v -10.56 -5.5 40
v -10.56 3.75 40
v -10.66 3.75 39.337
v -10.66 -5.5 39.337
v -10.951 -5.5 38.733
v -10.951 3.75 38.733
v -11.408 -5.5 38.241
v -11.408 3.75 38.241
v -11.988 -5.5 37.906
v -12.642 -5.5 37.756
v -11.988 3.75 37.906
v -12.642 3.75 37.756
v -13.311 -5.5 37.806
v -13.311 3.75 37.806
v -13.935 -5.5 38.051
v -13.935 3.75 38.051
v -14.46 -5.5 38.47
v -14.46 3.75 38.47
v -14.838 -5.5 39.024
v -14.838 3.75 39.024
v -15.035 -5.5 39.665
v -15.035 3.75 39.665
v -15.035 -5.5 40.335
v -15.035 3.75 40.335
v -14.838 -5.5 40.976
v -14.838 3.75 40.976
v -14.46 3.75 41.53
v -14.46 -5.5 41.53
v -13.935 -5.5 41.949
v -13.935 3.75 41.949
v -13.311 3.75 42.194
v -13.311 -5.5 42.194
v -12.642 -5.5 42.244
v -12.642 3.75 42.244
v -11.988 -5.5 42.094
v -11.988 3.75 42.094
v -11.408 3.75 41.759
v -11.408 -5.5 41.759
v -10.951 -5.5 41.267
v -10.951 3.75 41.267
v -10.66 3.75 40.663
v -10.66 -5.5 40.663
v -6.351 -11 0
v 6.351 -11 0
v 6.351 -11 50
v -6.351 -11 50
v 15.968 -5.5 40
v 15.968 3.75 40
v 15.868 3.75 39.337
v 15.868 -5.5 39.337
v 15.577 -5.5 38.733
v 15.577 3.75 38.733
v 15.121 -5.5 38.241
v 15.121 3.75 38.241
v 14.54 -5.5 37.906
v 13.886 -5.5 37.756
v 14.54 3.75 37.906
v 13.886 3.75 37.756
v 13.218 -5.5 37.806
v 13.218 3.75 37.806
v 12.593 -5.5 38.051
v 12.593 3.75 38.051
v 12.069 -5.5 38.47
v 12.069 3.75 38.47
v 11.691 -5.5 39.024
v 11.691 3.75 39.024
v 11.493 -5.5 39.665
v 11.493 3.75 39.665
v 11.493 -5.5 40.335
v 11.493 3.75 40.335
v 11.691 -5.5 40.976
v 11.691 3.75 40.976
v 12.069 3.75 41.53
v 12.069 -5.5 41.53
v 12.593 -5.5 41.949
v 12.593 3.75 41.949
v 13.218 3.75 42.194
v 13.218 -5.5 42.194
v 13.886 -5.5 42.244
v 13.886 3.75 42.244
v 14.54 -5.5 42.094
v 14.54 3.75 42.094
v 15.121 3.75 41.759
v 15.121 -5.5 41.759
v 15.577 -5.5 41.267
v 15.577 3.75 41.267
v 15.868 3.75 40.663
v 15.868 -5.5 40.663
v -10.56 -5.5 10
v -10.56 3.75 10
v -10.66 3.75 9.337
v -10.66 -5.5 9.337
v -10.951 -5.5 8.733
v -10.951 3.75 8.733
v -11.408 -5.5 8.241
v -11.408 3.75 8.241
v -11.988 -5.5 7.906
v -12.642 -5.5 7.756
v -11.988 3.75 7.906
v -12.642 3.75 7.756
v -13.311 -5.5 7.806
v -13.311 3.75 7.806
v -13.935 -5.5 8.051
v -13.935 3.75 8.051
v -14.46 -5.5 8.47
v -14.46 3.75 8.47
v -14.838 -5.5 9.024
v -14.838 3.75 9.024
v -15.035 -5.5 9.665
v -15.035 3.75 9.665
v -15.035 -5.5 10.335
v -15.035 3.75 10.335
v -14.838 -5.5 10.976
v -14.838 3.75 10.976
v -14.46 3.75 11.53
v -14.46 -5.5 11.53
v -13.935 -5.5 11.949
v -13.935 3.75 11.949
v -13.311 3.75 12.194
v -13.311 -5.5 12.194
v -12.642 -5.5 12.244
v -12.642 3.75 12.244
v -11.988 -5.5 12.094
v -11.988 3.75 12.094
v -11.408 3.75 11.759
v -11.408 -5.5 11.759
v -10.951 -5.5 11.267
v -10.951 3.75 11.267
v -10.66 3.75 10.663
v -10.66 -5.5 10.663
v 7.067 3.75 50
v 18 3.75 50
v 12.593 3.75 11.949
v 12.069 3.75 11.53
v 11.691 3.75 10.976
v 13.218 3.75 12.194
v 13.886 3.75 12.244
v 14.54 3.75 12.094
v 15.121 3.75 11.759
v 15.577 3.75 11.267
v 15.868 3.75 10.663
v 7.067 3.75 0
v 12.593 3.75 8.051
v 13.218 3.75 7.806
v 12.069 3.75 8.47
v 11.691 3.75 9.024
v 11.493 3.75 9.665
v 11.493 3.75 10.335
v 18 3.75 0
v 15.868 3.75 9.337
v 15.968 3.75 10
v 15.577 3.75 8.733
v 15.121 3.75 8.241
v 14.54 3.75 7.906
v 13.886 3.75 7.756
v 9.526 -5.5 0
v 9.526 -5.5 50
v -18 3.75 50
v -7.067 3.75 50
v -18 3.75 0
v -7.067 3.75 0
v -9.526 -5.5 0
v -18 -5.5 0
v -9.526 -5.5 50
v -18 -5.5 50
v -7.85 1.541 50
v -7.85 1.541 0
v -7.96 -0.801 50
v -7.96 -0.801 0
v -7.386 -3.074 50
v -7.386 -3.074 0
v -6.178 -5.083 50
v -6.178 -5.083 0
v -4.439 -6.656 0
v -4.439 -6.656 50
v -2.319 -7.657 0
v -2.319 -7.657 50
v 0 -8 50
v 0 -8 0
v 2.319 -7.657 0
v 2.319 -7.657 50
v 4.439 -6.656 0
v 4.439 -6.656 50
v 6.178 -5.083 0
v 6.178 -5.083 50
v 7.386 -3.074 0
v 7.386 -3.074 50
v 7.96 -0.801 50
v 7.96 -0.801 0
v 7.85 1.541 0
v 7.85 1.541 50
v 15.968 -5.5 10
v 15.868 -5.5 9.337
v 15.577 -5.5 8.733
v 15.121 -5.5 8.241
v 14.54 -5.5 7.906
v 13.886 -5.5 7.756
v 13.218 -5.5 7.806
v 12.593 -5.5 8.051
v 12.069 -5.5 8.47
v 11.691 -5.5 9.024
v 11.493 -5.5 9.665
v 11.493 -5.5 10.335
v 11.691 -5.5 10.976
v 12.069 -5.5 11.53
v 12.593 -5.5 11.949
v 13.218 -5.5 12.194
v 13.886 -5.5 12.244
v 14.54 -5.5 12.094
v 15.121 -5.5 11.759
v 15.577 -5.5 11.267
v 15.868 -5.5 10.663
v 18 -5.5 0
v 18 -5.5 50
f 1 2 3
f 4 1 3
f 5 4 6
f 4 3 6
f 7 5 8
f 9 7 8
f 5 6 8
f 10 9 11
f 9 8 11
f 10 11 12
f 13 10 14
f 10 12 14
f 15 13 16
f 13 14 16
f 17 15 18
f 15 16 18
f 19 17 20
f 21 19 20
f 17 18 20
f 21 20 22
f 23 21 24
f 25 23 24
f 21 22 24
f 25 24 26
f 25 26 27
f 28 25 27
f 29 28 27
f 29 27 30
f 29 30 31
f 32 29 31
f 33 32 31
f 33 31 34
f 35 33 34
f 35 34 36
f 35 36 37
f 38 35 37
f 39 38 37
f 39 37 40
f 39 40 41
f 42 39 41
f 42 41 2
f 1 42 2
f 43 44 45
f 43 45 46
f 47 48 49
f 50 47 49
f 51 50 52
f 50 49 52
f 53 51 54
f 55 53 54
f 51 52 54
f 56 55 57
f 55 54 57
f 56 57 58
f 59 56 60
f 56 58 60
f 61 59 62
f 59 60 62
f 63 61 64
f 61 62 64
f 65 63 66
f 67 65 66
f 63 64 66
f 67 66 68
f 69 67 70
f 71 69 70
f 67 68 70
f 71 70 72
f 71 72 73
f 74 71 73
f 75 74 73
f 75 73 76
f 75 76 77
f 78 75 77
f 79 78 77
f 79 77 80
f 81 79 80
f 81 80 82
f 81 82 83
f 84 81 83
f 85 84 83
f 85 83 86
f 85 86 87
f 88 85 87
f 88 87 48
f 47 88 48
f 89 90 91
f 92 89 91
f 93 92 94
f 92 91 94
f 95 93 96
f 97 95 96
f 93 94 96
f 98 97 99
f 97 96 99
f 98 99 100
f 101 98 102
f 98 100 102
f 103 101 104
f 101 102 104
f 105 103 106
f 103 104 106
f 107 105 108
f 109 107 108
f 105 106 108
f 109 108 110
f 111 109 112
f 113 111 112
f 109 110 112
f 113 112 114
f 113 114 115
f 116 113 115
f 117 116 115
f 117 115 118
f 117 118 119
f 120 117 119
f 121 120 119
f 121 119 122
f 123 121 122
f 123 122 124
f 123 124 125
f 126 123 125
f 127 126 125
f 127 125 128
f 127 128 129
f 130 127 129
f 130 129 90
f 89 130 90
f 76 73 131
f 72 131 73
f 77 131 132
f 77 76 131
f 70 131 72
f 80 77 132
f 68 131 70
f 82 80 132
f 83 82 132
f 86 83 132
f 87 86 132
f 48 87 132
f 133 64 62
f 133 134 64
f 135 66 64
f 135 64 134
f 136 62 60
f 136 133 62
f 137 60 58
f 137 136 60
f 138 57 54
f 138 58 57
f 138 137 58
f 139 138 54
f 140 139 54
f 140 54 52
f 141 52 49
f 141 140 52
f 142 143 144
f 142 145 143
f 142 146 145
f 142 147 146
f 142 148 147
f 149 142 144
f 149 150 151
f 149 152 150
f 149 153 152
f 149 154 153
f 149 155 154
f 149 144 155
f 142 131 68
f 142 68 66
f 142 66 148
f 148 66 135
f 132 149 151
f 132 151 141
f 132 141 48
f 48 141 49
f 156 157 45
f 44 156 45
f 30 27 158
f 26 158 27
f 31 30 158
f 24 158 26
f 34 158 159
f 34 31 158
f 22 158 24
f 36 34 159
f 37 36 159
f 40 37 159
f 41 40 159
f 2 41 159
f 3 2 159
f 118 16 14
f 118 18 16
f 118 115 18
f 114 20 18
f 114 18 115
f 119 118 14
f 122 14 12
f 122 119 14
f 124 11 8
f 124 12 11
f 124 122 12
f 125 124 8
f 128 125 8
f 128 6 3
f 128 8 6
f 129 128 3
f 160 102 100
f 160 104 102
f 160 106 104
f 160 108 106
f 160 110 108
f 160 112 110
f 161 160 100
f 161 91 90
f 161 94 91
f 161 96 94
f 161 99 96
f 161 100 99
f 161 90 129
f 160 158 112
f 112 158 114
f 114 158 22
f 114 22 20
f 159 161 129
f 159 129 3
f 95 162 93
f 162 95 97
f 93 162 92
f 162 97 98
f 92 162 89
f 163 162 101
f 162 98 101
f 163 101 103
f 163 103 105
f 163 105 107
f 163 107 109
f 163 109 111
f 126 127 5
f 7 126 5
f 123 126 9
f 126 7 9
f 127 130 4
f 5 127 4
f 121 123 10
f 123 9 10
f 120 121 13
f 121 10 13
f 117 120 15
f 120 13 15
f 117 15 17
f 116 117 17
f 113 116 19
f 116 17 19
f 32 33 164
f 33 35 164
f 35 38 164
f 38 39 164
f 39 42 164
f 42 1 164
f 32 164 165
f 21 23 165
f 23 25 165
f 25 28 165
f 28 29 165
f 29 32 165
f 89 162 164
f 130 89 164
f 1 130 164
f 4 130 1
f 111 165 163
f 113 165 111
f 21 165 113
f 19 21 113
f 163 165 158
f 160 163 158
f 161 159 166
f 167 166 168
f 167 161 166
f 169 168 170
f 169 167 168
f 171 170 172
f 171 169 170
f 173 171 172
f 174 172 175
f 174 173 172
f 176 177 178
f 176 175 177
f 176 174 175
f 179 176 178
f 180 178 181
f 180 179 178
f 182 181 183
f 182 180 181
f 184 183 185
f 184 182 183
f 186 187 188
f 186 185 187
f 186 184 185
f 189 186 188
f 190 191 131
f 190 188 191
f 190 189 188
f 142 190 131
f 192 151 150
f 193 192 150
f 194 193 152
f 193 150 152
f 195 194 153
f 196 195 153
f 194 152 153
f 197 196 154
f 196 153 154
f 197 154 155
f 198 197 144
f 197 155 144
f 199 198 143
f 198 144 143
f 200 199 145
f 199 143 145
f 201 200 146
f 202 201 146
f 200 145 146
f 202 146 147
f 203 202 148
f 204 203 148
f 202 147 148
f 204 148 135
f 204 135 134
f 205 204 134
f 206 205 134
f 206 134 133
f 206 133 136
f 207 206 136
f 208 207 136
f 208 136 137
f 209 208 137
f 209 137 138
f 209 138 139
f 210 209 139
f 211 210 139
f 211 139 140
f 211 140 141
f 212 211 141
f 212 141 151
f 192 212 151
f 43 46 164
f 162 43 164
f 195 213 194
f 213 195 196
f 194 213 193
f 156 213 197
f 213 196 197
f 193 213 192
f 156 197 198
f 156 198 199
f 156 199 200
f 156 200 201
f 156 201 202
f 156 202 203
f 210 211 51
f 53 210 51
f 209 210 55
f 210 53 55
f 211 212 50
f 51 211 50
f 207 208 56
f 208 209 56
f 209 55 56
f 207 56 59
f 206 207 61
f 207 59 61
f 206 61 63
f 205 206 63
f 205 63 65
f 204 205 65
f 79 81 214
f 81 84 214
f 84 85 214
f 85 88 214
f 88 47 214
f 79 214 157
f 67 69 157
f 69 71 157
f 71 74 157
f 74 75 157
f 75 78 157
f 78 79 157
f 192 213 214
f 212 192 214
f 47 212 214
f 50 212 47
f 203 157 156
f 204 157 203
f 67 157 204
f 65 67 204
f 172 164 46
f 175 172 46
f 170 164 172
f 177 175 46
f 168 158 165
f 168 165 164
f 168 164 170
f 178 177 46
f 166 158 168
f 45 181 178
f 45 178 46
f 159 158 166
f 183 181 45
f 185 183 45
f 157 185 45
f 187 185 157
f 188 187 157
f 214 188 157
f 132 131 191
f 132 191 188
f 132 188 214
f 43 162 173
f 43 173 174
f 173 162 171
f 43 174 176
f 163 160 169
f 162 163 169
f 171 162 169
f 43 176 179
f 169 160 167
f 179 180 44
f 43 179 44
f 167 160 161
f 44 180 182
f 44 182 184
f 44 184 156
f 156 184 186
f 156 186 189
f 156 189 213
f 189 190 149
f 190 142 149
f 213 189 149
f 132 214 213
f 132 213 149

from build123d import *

# Parameters (mm, degrees)
IZIM1_W                     = 36
IZIM1_H                     = 36
IZIM1_R                     = 8
Y_KSEKLIK_EKSTR_ZYON1_DEPTH = 50
IZIM2_W                     = 36
IZIM2_H                     = 5
KES_EKSTR_ZYON1_DEPTH       = 50
IZIM3_W                     = 36
IZIM3_H                     = 3
KES_EKSTR_ZYON2_DEPTH       = 50
KES_EKSTR_ZYON3_DEPTH       = 50
M4_BO_LUKLU_DELIK1_D        = 4.5
KES_EKSTR_ZYON5_START       = -50
KES_EKSTR_ZYON5_DEPTH       = 50


# Read off the part's stored shape, not the designer's step: Kes-Ekstrüzyon5
with BuildPart() as part:
    # Çizim1 → Yükseklik-Ekstrüzyon1 (new body)
    with BuildSketch(Plane.XY):
        Rectangle(IZIM1_W, IZIM1_H)
        Circle(IZIM1_R, mode=Mode.SUBTRACT)
    extrude(amount=Y_KSEKLIK_EKSTR_ZYON1_DEPTH)

    # Çizim2 → Kes-Ekstrüzyon1 (cut)
    with BuildSketch(Plane.XY.offset(50)):
        with Locations((0, 15.5)):
            Rectangle(IZIM2_W, IZIM2_H)
    extrude(amount=-KES_EKSTR_ZYON1_DEPTH, mode=Mode.SUBTRACT)

    # Çizim3 → Kes-Ekstrüzyon2 (cut)
    with BuildSketch(Plane.XY.offset(50)):
        with Locations((0, -16.5)):
            Rectangle(IZIM3_W, IZIM3_H)
    extrude(amount=-KES_EKSTR_ZYON2_DEPTH, mode=Mode.SUBTRACT)

    # Çizim4 → Kes-Ekstrüzyon3 (cut)
    with BuildSketch(Plane.XY.offset(50)):
        Polygon((-6.350852961, -11), (-9.526279442, -5.5), (-18, -5.5), (-18, -15), (18, -15), (18, -5.5), (9.526279442, -5.5), (6.350852961, -11), align=None)
    extrude(amount=-KES_EKSTR_ZYON3_DEPTH, mode=Mode.SUBTRACT)

    # M4 Boşluklu Delik1 (through all)
    with Locations(Plane(origin=(0, -5.5, 0), x_dir=(-1, 0, 0), z_dir=(0, -1, 0))):
        with Locations((-13.718329125, -40), (-13.718329125, -10), (12.810498521, -10), (12.810498521, -40)):
            Hole(M4_BO_LUKLU_DELIK1_D / 2)

    # Kes-Ekstrüzyon5 outline → Kes-Ekstrüzyon5 (cut)
    with BuildSketch(Plane.XY.offset(50).offset(KES_EKSTR_ZYON5_START)):
        with BuildLine():
            Line((7.066647013, 3.75), (18, 3.75))
            Line((18, 3.75), (18, 13))
            Line((18, 13), (-18, 13))
            Line((-18, 13), (-18, 3.75))
            Line((-18, 3.75), (-7.066647013, 3.75))
            ThreePointArc((-7.066647013, 3.75), (0, 8), (7.066647013, 3.75))
        make_face()
    extrude(amount=KES_EKSTR_ZYON5_DEPTH, mode=Mode.SUBTRACT)


solid = part.part
